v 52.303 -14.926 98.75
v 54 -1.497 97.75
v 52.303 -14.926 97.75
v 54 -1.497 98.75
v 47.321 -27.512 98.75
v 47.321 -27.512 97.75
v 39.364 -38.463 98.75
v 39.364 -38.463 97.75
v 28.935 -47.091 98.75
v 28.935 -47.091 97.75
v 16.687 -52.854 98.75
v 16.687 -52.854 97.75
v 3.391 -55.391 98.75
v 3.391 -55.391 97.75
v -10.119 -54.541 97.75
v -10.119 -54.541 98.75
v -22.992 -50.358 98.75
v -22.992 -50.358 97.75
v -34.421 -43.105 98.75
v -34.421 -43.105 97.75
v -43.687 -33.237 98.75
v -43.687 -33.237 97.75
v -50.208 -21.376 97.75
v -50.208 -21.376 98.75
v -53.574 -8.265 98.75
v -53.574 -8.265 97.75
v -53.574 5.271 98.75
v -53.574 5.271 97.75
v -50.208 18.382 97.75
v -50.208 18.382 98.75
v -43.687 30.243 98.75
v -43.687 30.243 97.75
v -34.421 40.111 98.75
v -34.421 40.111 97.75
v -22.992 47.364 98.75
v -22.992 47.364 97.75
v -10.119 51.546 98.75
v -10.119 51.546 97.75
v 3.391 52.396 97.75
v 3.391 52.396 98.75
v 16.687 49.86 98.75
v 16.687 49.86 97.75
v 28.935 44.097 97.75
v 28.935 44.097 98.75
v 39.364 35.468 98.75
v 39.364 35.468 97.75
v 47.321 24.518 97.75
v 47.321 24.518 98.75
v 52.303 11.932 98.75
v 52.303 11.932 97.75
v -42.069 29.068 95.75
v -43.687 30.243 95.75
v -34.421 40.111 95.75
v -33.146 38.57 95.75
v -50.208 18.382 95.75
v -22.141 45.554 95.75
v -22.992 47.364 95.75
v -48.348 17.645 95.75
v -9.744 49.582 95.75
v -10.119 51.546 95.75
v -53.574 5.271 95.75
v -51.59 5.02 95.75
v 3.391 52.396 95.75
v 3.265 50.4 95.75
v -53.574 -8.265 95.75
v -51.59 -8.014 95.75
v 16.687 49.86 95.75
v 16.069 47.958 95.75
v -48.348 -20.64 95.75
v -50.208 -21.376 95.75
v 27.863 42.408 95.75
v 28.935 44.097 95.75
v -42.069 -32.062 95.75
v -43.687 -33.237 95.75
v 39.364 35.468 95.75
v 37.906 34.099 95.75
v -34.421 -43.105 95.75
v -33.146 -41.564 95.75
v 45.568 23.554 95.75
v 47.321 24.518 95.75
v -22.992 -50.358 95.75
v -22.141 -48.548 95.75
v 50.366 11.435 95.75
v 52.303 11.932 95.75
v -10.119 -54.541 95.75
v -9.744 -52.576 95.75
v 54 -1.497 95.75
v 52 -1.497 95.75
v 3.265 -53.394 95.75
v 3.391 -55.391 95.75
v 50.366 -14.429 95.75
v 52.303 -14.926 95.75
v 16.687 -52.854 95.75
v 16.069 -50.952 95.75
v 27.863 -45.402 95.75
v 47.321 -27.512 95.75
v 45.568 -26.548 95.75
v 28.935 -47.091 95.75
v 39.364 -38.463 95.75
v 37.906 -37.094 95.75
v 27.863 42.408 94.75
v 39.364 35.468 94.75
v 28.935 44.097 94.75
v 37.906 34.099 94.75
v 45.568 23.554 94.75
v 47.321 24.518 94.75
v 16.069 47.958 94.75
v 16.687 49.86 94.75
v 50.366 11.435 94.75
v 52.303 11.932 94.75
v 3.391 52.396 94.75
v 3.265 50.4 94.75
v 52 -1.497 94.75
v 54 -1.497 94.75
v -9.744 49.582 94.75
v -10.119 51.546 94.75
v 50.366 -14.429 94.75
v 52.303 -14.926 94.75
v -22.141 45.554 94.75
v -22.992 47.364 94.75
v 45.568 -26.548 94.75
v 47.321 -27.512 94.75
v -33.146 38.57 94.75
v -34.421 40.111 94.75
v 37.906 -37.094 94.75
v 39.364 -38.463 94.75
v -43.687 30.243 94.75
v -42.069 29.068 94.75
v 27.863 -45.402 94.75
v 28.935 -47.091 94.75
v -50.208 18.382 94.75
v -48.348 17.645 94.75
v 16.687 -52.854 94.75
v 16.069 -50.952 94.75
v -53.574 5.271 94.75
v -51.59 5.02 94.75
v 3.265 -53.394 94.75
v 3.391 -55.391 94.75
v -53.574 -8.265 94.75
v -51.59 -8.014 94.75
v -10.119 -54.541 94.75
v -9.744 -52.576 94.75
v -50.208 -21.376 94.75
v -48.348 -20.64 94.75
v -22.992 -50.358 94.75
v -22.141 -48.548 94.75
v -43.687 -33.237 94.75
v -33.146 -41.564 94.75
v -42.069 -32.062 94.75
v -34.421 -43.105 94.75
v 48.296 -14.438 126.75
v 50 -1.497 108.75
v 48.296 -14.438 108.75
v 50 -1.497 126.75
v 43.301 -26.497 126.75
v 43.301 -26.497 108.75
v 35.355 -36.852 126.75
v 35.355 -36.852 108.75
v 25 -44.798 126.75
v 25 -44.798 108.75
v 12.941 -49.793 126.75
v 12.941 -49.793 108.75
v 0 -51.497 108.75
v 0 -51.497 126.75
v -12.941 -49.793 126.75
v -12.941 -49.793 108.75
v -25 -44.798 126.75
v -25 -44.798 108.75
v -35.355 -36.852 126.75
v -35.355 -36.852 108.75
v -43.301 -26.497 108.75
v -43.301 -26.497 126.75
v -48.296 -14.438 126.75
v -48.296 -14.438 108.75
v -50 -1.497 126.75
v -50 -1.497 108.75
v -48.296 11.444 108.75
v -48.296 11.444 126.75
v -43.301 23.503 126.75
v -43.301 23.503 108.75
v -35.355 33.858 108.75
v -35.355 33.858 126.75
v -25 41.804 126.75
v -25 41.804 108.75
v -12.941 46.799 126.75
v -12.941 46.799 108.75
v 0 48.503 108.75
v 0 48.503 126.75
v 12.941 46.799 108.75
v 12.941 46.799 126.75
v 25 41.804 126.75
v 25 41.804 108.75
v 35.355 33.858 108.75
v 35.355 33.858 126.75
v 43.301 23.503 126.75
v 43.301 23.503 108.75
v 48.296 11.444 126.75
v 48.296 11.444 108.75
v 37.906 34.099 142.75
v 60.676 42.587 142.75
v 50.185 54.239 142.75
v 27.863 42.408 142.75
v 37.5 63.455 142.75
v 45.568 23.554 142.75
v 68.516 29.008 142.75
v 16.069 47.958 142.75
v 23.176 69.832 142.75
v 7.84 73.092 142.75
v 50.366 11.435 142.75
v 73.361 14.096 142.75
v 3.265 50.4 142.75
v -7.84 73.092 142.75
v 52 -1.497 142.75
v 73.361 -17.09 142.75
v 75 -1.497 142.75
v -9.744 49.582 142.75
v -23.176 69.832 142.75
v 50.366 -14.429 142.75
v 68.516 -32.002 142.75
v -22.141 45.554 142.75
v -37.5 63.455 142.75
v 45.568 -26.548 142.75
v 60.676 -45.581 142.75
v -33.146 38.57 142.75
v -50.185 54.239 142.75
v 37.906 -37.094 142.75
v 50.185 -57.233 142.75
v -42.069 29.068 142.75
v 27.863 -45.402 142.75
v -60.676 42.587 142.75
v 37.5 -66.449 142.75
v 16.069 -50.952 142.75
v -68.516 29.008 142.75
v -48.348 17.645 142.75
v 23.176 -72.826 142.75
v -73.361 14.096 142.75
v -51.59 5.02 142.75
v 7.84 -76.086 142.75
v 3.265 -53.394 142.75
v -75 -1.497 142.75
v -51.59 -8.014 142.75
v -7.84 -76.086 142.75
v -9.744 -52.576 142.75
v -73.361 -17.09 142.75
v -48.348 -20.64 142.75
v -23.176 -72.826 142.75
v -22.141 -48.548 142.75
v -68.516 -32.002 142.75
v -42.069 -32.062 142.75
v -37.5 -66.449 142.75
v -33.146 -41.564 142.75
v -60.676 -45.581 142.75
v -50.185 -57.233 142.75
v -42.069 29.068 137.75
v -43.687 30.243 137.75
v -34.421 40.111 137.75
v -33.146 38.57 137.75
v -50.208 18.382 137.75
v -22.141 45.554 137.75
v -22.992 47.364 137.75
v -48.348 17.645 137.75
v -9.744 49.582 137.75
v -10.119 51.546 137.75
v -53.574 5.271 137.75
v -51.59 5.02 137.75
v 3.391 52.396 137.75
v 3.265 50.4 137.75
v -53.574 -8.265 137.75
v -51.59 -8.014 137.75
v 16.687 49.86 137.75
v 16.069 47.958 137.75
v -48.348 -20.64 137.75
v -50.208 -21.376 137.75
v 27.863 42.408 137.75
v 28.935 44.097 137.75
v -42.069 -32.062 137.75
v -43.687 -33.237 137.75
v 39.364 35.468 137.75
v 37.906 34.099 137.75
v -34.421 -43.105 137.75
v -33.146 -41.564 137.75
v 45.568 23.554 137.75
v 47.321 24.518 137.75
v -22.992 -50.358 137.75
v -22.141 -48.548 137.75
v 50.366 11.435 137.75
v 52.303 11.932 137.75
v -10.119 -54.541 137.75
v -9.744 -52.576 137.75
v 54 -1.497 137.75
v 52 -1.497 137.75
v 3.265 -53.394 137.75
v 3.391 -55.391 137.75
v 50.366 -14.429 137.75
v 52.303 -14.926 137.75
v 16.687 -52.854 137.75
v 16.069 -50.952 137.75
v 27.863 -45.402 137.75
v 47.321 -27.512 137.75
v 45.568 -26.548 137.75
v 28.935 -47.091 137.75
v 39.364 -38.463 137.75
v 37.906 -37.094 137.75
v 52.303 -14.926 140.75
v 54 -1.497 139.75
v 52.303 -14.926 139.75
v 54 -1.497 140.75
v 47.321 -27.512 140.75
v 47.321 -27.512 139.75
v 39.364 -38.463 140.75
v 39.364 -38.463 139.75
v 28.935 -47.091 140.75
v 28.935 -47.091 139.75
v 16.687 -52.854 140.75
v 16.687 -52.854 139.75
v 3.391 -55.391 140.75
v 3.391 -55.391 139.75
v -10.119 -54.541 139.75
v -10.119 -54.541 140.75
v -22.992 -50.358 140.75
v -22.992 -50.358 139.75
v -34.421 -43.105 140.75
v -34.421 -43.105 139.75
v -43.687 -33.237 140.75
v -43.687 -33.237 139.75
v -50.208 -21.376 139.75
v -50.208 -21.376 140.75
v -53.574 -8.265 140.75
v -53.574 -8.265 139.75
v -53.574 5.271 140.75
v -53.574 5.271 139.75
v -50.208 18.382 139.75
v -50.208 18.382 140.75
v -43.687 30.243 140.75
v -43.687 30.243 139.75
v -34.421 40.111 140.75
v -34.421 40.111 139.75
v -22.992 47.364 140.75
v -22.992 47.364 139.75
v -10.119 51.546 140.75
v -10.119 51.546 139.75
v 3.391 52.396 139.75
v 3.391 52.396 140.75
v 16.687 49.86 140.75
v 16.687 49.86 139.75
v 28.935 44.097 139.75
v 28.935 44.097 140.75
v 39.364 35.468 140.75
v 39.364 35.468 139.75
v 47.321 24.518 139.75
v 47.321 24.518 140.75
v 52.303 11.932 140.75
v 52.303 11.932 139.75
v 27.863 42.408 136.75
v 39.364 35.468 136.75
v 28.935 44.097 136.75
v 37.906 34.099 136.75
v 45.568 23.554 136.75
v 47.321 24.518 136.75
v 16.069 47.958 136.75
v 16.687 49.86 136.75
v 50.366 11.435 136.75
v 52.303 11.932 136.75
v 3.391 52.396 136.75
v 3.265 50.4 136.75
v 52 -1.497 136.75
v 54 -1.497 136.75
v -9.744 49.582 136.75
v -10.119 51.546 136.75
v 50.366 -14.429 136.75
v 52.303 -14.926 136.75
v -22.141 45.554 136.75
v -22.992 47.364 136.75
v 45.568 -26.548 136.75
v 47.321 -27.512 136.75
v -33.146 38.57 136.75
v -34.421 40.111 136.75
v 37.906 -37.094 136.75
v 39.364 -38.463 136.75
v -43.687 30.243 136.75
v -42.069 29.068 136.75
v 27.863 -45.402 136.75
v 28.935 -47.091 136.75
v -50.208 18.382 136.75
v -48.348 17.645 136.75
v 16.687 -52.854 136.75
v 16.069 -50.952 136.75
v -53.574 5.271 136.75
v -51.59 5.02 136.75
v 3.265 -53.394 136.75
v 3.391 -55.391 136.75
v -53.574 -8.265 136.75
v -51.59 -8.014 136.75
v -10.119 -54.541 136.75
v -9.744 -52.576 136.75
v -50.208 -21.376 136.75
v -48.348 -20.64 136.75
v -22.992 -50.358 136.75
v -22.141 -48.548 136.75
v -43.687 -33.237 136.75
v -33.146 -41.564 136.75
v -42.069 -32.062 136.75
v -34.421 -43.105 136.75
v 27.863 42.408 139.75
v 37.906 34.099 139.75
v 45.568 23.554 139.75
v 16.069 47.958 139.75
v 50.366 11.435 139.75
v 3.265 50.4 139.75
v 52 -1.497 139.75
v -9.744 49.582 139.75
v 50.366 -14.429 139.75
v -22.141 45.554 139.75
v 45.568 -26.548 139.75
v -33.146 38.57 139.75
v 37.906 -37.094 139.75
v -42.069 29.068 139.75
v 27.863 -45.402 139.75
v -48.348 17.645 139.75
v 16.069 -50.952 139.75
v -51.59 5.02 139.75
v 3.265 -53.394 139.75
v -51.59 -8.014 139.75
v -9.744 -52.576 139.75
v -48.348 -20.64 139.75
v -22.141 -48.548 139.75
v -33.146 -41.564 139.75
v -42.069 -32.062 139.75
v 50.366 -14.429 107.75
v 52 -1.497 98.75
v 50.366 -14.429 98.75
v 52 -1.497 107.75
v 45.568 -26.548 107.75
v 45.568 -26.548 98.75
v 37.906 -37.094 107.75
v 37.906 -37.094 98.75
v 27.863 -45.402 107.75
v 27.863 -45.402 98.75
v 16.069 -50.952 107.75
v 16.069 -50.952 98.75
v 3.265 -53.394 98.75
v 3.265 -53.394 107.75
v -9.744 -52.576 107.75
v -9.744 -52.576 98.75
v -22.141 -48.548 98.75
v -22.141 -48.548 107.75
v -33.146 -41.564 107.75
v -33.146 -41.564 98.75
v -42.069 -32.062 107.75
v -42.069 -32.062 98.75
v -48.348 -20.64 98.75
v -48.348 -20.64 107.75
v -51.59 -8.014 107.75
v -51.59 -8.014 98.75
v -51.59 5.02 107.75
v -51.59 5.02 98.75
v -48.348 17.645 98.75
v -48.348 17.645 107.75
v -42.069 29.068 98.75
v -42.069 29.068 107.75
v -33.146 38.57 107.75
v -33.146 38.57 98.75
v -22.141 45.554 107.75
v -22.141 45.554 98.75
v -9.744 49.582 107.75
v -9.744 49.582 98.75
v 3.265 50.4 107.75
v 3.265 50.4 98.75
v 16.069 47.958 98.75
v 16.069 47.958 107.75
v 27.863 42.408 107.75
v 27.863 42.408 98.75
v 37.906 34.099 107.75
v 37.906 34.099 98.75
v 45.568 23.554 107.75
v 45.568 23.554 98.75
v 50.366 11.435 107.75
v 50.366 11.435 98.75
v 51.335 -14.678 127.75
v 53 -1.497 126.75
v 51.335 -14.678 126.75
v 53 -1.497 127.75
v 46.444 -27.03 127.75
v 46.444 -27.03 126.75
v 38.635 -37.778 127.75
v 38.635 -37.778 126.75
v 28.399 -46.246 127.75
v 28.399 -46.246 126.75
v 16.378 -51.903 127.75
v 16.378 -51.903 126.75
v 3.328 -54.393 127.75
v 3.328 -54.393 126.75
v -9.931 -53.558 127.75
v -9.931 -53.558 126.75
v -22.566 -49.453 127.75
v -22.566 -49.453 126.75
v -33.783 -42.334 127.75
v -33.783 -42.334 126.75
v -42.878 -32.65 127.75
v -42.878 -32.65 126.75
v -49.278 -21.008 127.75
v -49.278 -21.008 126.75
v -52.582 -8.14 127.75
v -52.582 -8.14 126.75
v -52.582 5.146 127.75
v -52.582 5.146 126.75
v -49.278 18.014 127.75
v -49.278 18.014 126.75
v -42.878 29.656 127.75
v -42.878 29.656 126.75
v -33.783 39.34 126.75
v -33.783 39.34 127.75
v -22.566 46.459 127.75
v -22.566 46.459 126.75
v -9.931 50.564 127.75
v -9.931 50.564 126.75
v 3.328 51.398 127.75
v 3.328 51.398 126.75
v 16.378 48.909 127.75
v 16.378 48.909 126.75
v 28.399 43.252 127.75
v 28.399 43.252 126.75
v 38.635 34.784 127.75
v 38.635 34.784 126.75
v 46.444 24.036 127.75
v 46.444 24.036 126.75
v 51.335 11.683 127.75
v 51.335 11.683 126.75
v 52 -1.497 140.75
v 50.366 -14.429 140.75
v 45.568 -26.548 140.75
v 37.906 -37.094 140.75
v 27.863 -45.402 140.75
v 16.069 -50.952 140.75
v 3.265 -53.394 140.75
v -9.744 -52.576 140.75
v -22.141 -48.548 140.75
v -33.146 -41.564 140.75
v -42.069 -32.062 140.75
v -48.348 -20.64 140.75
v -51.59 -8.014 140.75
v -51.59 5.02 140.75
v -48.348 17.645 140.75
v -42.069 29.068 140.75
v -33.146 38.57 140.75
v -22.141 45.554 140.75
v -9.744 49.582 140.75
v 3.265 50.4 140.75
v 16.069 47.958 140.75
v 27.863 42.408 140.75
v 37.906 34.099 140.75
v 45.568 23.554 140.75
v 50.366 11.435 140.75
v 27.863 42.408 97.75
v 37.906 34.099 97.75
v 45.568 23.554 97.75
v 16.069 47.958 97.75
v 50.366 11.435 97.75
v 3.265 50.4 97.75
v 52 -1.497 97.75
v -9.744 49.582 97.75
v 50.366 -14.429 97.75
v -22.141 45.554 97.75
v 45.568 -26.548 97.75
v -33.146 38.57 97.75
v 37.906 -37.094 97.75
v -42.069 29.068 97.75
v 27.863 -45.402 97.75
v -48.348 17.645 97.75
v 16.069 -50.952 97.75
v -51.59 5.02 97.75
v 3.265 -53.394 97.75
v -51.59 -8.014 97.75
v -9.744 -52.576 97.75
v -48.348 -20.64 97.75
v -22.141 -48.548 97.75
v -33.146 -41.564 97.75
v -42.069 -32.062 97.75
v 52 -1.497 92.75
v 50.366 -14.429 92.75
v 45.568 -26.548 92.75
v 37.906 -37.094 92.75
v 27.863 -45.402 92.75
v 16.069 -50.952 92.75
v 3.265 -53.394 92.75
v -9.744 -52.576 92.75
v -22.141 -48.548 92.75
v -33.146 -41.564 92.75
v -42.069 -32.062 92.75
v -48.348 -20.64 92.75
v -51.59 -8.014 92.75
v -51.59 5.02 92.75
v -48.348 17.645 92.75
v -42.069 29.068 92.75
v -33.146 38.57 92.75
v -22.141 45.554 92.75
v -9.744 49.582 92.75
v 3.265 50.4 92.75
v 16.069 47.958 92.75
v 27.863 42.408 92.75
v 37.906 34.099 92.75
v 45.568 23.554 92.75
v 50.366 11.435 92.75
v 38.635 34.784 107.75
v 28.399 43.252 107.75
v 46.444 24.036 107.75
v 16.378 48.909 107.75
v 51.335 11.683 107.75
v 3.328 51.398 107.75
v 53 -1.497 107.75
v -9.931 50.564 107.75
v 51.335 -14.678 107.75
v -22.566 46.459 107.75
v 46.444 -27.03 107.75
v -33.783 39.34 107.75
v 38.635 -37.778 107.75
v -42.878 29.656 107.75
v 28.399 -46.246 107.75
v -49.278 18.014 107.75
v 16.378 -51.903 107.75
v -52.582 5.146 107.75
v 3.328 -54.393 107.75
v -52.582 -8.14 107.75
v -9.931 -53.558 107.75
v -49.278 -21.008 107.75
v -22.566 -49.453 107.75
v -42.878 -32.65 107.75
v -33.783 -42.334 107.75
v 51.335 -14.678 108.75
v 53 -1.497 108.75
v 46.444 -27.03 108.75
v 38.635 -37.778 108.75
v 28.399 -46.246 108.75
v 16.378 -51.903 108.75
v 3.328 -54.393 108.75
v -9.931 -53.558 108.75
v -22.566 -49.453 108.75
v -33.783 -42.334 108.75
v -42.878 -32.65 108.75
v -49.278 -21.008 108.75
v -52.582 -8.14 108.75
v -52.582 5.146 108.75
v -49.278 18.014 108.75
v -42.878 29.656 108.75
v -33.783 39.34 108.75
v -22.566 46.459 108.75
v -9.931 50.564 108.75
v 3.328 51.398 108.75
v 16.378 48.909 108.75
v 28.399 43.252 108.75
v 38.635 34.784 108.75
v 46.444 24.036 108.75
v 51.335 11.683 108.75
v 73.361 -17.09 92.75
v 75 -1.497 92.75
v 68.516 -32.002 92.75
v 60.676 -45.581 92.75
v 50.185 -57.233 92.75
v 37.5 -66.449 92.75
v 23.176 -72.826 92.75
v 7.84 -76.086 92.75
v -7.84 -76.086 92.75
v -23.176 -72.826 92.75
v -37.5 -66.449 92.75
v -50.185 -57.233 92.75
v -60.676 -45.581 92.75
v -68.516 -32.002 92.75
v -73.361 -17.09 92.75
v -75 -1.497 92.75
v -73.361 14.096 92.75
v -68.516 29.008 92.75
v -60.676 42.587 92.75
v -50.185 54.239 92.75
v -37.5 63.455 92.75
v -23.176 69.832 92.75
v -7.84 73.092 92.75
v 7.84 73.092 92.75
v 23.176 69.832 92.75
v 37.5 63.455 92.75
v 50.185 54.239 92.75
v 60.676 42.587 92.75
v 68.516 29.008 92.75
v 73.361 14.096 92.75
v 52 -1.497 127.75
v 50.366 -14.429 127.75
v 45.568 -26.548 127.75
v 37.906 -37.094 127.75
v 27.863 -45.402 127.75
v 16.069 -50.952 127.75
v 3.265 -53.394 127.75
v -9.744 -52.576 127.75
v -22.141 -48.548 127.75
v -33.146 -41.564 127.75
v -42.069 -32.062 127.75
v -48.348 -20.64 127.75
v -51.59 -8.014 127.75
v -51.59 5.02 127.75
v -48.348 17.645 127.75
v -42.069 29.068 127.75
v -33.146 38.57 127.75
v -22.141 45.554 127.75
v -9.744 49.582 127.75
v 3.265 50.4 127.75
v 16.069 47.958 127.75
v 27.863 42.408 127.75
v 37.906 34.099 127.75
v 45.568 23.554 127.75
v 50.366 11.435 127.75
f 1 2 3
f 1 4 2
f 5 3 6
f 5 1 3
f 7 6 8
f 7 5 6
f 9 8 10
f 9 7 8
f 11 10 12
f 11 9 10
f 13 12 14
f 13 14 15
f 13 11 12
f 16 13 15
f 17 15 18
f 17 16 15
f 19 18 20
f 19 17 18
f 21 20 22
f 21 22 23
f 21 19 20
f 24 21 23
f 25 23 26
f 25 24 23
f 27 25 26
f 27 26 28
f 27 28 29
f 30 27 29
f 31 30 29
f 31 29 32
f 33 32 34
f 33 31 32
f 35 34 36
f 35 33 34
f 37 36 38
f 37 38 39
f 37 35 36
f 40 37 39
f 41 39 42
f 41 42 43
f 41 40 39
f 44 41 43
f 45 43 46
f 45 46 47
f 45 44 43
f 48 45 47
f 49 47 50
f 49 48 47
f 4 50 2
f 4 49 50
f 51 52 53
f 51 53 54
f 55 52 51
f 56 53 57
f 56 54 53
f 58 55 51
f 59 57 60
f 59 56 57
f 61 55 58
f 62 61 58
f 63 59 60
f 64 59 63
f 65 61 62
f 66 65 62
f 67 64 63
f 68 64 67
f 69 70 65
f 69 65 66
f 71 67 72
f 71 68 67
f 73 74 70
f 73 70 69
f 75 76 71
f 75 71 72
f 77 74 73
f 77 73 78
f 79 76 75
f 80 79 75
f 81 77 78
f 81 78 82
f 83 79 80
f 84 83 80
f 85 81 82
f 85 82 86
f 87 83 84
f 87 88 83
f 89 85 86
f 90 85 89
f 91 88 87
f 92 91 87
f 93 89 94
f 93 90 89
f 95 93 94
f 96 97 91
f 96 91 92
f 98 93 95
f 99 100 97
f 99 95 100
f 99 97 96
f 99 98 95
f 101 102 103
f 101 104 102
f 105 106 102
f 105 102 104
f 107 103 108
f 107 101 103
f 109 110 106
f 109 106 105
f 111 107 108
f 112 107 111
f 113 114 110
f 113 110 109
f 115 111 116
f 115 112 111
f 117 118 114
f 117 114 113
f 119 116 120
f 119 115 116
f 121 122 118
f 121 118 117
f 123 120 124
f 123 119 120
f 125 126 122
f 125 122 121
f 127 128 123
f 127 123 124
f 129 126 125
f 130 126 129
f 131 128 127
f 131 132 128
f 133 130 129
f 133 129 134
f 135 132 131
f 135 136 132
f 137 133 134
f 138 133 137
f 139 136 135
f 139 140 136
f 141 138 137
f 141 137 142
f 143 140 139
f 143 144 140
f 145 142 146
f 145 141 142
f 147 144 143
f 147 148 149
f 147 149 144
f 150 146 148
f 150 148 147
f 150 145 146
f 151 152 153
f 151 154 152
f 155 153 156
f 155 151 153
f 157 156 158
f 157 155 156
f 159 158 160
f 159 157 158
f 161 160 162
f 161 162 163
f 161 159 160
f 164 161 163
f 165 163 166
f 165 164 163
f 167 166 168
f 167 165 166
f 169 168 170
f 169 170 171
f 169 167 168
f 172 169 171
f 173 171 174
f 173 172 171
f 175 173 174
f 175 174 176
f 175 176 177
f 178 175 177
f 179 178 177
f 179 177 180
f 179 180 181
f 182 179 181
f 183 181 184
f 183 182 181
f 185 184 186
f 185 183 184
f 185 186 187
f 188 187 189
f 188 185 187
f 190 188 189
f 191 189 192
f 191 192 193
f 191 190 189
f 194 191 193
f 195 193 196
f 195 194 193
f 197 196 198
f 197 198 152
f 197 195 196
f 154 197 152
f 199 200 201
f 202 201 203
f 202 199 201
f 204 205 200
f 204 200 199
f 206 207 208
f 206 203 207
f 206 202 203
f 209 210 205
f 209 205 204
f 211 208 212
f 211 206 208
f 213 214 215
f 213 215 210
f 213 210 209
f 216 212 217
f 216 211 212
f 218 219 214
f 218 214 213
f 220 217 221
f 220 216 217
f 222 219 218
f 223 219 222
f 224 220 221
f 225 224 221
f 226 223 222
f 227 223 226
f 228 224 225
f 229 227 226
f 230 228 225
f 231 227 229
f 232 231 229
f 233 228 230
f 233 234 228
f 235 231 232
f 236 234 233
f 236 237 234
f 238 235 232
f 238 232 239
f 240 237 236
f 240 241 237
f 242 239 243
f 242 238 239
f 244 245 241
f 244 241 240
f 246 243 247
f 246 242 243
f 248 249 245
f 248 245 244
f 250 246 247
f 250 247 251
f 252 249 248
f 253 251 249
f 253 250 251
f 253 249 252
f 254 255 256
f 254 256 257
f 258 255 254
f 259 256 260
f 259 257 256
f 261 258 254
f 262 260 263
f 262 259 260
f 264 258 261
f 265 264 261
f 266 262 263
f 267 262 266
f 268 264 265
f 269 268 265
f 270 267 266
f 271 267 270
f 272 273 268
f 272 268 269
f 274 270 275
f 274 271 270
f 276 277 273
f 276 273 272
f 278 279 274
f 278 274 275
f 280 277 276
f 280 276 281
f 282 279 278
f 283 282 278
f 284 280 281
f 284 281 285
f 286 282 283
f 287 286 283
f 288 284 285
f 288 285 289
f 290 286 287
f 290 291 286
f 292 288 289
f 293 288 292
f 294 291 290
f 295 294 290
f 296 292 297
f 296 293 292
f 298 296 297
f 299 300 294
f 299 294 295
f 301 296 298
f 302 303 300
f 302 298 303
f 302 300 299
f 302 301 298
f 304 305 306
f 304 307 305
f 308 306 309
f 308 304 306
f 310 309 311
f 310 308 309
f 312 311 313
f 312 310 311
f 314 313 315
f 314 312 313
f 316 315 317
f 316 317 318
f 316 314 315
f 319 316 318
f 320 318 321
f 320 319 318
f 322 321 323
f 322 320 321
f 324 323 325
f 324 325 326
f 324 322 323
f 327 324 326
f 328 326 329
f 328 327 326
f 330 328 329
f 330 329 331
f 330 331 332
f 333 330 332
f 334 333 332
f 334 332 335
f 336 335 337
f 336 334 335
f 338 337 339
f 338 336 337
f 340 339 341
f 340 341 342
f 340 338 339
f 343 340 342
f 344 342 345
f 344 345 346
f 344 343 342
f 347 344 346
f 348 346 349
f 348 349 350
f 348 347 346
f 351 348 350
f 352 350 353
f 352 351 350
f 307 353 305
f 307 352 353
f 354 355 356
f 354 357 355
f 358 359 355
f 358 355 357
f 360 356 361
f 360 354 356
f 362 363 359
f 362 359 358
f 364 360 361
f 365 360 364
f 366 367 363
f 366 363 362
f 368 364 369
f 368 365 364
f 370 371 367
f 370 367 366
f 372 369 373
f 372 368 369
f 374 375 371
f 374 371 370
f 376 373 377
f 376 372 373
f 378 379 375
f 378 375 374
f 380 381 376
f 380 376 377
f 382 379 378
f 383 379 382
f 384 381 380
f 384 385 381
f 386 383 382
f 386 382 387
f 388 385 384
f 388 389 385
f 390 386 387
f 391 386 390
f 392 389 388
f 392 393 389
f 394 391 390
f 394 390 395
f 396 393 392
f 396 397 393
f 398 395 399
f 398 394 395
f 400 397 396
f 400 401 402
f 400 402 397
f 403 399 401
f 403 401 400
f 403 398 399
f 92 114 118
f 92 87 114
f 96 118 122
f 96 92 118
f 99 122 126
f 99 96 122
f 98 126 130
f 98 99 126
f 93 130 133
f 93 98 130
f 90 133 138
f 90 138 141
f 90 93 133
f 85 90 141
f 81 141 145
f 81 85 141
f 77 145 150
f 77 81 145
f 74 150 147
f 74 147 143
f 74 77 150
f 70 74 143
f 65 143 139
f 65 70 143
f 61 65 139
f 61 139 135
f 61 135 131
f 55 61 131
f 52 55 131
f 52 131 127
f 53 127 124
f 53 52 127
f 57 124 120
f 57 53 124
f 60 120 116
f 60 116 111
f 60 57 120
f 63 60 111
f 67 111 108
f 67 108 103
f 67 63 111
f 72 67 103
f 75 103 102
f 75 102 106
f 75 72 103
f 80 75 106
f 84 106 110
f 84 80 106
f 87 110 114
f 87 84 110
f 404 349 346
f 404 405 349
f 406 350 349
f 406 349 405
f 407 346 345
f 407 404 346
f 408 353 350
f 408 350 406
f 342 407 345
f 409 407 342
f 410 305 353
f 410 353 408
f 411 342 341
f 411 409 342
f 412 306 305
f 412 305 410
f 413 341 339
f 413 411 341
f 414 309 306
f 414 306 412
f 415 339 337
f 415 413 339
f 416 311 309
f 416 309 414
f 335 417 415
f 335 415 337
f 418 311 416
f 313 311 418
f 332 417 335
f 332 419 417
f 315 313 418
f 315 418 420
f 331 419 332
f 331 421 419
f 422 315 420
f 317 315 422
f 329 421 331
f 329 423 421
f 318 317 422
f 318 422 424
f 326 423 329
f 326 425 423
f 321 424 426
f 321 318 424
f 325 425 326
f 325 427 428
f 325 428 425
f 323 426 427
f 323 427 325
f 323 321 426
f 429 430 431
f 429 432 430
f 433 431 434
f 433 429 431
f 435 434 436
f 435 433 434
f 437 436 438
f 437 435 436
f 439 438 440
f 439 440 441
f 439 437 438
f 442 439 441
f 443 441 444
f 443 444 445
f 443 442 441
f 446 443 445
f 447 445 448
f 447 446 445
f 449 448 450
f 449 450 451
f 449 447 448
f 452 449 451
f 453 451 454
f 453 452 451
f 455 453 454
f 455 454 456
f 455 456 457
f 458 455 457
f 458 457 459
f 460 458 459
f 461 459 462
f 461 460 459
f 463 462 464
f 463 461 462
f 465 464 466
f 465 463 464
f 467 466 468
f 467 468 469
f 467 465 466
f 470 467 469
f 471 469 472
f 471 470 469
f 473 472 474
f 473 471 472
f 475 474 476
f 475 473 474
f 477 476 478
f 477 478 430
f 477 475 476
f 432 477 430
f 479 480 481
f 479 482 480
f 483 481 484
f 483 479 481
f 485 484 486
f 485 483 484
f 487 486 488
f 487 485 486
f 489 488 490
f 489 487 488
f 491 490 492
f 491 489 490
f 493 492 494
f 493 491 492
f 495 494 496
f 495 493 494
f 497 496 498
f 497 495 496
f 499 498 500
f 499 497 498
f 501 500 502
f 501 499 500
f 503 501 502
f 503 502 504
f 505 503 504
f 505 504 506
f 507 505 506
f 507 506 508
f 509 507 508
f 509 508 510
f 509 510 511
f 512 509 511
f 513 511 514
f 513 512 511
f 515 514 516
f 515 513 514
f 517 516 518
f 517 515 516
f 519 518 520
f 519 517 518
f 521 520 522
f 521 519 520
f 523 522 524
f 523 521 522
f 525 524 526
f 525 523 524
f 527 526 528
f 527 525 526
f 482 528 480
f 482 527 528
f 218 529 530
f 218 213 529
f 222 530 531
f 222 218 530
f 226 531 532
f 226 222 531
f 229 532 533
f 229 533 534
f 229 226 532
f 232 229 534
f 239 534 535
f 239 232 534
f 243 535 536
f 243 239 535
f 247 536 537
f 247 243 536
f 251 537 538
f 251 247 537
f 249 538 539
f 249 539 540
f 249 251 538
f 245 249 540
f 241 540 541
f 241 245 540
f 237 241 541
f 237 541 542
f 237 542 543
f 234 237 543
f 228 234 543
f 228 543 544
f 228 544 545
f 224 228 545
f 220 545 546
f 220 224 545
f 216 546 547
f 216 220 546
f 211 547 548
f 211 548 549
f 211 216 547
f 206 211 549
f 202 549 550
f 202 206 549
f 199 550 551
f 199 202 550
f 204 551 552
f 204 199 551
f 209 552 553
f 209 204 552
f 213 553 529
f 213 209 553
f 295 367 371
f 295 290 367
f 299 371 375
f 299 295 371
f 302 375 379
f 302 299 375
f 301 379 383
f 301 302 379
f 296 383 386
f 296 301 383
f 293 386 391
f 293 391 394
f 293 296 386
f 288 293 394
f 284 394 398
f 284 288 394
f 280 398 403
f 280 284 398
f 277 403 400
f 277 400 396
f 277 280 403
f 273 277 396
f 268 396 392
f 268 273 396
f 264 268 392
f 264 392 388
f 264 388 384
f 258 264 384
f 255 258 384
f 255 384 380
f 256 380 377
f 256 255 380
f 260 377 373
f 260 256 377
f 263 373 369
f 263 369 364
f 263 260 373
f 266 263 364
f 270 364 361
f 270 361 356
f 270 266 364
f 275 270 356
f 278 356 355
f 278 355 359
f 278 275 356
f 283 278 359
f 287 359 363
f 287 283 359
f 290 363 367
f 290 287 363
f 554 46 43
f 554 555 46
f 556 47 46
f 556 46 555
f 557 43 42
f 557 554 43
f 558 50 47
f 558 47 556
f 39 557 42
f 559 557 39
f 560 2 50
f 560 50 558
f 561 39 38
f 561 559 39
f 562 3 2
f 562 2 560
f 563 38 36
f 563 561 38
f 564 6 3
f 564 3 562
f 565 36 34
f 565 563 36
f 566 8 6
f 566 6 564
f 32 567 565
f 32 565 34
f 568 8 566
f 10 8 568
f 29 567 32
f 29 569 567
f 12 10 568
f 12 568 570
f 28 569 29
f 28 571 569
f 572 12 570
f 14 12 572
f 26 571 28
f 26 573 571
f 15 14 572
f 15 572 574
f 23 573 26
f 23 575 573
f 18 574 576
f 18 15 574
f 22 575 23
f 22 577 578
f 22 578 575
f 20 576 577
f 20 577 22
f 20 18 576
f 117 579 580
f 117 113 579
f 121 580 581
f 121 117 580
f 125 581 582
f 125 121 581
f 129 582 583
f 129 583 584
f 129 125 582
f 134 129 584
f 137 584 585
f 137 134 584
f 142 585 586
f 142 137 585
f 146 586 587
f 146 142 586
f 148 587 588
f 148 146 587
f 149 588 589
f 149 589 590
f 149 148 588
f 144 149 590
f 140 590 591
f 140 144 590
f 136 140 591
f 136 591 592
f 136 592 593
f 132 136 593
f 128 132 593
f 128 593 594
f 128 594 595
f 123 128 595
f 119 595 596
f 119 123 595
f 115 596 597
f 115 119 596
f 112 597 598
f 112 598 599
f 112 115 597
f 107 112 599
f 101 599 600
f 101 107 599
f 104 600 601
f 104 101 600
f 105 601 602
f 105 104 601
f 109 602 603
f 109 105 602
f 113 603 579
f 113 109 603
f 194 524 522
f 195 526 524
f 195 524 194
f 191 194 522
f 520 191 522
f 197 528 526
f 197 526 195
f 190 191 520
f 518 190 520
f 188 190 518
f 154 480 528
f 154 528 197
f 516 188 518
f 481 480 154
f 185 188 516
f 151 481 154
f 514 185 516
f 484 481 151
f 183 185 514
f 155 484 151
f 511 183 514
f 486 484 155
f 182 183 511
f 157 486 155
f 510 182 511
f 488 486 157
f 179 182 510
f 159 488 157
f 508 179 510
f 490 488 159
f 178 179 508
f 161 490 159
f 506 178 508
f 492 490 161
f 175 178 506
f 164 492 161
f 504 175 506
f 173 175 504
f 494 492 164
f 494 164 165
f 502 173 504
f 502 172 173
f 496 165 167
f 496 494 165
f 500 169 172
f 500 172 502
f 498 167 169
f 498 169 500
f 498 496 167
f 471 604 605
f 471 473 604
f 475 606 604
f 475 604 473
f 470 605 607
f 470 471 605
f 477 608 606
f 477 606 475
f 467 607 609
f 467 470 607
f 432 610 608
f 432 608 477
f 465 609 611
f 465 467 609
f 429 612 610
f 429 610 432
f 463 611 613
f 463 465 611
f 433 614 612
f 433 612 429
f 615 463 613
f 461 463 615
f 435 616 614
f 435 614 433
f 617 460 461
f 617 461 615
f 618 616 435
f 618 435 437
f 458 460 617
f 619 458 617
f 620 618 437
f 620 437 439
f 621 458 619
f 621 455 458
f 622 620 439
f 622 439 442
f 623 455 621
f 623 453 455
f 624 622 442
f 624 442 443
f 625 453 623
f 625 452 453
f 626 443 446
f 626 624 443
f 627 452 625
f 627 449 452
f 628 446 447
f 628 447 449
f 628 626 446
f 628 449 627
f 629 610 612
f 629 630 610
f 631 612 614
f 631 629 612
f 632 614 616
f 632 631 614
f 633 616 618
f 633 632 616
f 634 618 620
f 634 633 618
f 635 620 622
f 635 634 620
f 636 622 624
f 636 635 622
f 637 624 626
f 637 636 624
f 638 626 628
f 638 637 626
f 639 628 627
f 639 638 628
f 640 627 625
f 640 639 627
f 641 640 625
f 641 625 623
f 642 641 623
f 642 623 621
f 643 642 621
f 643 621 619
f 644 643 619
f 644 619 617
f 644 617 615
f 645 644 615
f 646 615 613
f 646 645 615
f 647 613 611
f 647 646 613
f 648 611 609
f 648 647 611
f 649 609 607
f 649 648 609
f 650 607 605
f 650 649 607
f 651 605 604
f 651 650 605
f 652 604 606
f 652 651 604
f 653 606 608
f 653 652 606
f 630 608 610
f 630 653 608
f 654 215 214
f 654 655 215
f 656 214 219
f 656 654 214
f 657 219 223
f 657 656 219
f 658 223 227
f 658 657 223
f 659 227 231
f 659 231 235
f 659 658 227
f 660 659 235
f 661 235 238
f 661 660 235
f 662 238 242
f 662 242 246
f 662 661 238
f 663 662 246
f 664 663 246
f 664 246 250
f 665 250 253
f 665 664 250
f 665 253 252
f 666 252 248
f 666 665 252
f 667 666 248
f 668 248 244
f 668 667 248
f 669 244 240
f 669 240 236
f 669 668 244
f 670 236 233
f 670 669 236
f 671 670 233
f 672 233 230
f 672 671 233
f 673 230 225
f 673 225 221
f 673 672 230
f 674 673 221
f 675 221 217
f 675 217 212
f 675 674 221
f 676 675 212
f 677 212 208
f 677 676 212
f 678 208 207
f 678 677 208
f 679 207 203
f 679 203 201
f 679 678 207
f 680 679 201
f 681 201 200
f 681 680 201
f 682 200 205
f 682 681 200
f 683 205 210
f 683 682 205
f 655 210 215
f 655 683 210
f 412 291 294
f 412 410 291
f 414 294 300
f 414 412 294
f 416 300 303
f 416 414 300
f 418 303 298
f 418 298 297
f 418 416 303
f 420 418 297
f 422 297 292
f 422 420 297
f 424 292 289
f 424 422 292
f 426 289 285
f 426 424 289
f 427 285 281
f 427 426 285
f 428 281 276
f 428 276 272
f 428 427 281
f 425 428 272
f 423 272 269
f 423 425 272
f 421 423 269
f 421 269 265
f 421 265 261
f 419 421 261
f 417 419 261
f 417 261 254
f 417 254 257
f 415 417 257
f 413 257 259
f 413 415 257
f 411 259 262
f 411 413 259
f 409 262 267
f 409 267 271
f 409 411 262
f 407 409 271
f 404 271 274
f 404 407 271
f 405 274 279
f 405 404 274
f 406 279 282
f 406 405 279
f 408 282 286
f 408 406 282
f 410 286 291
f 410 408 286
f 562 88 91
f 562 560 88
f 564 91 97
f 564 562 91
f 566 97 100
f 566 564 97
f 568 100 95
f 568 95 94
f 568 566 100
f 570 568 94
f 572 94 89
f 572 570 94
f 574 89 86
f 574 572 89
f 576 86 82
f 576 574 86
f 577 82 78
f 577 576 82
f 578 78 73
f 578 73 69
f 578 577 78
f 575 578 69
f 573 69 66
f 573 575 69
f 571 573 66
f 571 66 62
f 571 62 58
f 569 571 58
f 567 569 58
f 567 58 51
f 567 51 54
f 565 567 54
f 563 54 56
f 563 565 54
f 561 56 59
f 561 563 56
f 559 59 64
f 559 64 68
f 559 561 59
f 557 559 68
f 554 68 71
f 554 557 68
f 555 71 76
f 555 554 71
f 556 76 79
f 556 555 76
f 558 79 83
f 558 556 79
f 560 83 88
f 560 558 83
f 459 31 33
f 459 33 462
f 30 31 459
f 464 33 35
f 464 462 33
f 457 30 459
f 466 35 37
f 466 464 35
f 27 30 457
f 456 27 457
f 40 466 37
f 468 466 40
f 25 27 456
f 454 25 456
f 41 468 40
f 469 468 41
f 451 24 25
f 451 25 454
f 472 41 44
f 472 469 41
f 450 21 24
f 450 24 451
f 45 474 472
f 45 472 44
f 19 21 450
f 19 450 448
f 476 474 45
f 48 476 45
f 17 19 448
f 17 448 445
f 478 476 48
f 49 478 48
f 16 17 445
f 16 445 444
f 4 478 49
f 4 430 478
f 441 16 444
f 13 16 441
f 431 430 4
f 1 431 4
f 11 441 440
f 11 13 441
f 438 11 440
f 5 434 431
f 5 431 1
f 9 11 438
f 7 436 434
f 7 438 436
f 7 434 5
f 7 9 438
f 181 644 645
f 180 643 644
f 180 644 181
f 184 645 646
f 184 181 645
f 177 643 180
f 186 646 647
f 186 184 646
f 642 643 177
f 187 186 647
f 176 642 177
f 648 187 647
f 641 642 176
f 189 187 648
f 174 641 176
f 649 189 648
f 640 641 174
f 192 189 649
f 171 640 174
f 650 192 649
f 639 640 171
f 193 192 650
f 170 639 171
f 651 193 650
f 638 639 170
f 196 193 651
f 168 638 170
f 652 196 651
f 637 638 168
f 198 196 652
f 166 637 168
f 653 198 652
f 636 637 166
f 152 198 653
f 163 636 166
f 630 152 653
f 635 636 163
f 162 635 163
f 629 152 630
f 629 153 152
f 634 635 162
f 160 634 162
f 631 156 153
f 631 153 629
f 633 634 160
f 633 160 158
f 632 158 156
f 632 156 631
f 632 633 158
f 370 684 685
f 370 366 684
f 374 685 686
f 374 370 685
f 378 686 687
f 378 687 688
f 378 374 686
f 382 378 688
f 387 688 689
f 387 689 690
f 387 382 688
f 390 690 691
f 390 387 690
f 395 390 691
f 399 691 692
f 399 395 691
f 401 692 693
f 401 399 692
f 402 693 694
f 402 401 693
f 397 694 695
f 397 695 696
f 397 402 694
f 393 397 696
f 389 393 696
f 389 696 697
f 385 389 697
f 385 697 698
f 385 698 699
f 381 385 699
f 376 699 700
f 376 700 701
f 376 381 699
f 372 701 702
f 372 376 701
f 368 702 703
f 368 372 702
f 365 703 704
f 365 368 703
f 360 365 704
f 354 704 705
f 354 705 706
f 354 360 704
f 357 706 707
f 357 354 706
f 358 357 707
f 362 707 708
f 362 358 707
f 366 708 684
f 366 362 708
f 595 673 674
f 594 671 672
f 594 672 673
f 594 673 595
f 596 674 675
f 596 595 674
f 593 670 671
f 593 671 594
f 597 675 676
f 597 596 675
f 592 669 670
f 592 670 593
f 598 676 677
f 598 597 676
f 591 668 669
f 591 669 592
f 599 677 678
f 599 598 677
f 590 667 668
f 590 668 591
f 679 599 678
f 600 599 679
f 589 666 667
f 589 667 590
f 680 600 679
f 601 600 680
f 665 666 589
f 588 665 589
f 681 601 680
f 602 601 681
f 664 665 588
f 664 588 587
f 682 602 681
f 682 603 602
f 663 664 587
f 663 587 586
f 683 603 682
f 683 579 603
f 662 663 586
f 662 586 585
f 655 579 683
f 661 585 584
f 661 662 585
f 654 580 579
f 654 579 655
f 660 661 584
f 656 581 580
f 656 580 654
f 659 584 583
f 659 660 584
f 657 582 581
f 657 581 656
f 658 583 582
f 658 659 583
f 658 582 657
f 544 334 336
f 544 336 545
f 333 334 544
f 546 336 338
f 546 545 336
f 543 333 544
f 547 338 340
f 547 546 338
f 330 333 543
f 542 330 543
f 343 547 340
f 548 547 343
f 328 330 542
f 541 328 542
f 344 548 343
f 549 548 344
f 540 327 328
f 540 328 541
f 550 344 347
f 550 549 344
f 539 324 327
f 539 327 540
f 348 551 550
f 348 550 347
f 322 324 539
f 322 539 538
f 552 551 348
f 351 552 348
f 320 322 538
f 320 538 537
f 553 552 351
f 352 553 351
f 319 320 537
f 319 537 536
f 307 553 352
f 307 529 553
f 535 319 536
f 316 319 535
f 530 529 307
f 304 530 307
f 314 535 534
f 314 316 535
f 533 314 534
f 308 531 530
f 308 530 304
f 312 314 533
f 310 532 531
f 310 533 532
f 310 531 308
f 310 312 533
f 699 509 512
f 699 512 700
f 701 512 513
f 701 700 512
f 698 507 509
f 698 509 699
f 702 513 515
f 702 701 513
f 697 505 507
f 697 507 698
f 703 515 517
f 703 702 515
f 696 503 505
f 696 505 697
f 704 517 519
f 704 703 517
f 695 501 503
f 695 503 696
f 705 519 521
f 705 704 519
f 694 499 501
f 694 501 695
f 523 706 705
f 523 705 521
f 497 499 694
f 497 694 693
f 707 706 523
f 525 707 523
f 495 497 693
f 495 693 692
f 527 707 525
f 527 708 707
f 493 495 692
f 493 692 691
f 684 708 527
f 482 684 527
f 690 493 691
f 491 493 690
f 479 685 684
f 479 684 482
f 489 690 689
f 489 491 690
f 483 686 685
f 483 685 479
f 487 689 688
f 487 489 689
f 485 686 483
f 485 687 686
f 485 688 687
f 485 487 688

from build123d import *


with BuildPart() as part:
    # Sketch1 → Revolve1 (revolve)
    with BuildSketch(Plane(origin=(0, 0, 0), x_dir=(0, 0, -1), z_dir=(1, 0, 0)), mode=Mode.PRIVATE) as revolve1_sk:
        Polygon((-142.749573327, 73.502909781), (-92.749573327, 73.502909781), (-92.749573327, 50.502909781), (-94.749573327, 50.502909781), (-94.749573327, 52.502909781), (-95.749573327, 52.502909781), (-95.749573327, 50.502909781), (-97.749573327, 50.502909781), (-97.749573327, 52.502909781), (-98.749573327, 52.502909781), (-98.749573327, 50.502909781), (-107.749573327, 50.502909781), (-107.749573327, 51.502909781), (-108.749573327, 51.502909781), (-108.749573327, 48.502909781), (-126.749573327, 48.502909781), (-126.749573327, 51.502909781), (-127.749573327, 51.502909781), (-127.749573327, 50.502909781), (-136.749573327, 50.502909781), (-136.749573327, 52.502909781), (-137.749573327, 52.502909781), (-137.749573327, 50.502909781), (-139.749573327, 50.502909781), (-139.749573327, 52.502909781), (-140.749573327, 52.502909781), (-140.749573327, 50.502909781), (-142.749573327, 50.502909781), align=None)
    revolve(revolve1_sk.sketch.rotate(Axis((0, -1.497090219, 168.192153132), (0, 0, -1)), 90), axis=Axis((0, -1.497090219, 168.192153132), (0, 0, -1)))


solid = part.part
